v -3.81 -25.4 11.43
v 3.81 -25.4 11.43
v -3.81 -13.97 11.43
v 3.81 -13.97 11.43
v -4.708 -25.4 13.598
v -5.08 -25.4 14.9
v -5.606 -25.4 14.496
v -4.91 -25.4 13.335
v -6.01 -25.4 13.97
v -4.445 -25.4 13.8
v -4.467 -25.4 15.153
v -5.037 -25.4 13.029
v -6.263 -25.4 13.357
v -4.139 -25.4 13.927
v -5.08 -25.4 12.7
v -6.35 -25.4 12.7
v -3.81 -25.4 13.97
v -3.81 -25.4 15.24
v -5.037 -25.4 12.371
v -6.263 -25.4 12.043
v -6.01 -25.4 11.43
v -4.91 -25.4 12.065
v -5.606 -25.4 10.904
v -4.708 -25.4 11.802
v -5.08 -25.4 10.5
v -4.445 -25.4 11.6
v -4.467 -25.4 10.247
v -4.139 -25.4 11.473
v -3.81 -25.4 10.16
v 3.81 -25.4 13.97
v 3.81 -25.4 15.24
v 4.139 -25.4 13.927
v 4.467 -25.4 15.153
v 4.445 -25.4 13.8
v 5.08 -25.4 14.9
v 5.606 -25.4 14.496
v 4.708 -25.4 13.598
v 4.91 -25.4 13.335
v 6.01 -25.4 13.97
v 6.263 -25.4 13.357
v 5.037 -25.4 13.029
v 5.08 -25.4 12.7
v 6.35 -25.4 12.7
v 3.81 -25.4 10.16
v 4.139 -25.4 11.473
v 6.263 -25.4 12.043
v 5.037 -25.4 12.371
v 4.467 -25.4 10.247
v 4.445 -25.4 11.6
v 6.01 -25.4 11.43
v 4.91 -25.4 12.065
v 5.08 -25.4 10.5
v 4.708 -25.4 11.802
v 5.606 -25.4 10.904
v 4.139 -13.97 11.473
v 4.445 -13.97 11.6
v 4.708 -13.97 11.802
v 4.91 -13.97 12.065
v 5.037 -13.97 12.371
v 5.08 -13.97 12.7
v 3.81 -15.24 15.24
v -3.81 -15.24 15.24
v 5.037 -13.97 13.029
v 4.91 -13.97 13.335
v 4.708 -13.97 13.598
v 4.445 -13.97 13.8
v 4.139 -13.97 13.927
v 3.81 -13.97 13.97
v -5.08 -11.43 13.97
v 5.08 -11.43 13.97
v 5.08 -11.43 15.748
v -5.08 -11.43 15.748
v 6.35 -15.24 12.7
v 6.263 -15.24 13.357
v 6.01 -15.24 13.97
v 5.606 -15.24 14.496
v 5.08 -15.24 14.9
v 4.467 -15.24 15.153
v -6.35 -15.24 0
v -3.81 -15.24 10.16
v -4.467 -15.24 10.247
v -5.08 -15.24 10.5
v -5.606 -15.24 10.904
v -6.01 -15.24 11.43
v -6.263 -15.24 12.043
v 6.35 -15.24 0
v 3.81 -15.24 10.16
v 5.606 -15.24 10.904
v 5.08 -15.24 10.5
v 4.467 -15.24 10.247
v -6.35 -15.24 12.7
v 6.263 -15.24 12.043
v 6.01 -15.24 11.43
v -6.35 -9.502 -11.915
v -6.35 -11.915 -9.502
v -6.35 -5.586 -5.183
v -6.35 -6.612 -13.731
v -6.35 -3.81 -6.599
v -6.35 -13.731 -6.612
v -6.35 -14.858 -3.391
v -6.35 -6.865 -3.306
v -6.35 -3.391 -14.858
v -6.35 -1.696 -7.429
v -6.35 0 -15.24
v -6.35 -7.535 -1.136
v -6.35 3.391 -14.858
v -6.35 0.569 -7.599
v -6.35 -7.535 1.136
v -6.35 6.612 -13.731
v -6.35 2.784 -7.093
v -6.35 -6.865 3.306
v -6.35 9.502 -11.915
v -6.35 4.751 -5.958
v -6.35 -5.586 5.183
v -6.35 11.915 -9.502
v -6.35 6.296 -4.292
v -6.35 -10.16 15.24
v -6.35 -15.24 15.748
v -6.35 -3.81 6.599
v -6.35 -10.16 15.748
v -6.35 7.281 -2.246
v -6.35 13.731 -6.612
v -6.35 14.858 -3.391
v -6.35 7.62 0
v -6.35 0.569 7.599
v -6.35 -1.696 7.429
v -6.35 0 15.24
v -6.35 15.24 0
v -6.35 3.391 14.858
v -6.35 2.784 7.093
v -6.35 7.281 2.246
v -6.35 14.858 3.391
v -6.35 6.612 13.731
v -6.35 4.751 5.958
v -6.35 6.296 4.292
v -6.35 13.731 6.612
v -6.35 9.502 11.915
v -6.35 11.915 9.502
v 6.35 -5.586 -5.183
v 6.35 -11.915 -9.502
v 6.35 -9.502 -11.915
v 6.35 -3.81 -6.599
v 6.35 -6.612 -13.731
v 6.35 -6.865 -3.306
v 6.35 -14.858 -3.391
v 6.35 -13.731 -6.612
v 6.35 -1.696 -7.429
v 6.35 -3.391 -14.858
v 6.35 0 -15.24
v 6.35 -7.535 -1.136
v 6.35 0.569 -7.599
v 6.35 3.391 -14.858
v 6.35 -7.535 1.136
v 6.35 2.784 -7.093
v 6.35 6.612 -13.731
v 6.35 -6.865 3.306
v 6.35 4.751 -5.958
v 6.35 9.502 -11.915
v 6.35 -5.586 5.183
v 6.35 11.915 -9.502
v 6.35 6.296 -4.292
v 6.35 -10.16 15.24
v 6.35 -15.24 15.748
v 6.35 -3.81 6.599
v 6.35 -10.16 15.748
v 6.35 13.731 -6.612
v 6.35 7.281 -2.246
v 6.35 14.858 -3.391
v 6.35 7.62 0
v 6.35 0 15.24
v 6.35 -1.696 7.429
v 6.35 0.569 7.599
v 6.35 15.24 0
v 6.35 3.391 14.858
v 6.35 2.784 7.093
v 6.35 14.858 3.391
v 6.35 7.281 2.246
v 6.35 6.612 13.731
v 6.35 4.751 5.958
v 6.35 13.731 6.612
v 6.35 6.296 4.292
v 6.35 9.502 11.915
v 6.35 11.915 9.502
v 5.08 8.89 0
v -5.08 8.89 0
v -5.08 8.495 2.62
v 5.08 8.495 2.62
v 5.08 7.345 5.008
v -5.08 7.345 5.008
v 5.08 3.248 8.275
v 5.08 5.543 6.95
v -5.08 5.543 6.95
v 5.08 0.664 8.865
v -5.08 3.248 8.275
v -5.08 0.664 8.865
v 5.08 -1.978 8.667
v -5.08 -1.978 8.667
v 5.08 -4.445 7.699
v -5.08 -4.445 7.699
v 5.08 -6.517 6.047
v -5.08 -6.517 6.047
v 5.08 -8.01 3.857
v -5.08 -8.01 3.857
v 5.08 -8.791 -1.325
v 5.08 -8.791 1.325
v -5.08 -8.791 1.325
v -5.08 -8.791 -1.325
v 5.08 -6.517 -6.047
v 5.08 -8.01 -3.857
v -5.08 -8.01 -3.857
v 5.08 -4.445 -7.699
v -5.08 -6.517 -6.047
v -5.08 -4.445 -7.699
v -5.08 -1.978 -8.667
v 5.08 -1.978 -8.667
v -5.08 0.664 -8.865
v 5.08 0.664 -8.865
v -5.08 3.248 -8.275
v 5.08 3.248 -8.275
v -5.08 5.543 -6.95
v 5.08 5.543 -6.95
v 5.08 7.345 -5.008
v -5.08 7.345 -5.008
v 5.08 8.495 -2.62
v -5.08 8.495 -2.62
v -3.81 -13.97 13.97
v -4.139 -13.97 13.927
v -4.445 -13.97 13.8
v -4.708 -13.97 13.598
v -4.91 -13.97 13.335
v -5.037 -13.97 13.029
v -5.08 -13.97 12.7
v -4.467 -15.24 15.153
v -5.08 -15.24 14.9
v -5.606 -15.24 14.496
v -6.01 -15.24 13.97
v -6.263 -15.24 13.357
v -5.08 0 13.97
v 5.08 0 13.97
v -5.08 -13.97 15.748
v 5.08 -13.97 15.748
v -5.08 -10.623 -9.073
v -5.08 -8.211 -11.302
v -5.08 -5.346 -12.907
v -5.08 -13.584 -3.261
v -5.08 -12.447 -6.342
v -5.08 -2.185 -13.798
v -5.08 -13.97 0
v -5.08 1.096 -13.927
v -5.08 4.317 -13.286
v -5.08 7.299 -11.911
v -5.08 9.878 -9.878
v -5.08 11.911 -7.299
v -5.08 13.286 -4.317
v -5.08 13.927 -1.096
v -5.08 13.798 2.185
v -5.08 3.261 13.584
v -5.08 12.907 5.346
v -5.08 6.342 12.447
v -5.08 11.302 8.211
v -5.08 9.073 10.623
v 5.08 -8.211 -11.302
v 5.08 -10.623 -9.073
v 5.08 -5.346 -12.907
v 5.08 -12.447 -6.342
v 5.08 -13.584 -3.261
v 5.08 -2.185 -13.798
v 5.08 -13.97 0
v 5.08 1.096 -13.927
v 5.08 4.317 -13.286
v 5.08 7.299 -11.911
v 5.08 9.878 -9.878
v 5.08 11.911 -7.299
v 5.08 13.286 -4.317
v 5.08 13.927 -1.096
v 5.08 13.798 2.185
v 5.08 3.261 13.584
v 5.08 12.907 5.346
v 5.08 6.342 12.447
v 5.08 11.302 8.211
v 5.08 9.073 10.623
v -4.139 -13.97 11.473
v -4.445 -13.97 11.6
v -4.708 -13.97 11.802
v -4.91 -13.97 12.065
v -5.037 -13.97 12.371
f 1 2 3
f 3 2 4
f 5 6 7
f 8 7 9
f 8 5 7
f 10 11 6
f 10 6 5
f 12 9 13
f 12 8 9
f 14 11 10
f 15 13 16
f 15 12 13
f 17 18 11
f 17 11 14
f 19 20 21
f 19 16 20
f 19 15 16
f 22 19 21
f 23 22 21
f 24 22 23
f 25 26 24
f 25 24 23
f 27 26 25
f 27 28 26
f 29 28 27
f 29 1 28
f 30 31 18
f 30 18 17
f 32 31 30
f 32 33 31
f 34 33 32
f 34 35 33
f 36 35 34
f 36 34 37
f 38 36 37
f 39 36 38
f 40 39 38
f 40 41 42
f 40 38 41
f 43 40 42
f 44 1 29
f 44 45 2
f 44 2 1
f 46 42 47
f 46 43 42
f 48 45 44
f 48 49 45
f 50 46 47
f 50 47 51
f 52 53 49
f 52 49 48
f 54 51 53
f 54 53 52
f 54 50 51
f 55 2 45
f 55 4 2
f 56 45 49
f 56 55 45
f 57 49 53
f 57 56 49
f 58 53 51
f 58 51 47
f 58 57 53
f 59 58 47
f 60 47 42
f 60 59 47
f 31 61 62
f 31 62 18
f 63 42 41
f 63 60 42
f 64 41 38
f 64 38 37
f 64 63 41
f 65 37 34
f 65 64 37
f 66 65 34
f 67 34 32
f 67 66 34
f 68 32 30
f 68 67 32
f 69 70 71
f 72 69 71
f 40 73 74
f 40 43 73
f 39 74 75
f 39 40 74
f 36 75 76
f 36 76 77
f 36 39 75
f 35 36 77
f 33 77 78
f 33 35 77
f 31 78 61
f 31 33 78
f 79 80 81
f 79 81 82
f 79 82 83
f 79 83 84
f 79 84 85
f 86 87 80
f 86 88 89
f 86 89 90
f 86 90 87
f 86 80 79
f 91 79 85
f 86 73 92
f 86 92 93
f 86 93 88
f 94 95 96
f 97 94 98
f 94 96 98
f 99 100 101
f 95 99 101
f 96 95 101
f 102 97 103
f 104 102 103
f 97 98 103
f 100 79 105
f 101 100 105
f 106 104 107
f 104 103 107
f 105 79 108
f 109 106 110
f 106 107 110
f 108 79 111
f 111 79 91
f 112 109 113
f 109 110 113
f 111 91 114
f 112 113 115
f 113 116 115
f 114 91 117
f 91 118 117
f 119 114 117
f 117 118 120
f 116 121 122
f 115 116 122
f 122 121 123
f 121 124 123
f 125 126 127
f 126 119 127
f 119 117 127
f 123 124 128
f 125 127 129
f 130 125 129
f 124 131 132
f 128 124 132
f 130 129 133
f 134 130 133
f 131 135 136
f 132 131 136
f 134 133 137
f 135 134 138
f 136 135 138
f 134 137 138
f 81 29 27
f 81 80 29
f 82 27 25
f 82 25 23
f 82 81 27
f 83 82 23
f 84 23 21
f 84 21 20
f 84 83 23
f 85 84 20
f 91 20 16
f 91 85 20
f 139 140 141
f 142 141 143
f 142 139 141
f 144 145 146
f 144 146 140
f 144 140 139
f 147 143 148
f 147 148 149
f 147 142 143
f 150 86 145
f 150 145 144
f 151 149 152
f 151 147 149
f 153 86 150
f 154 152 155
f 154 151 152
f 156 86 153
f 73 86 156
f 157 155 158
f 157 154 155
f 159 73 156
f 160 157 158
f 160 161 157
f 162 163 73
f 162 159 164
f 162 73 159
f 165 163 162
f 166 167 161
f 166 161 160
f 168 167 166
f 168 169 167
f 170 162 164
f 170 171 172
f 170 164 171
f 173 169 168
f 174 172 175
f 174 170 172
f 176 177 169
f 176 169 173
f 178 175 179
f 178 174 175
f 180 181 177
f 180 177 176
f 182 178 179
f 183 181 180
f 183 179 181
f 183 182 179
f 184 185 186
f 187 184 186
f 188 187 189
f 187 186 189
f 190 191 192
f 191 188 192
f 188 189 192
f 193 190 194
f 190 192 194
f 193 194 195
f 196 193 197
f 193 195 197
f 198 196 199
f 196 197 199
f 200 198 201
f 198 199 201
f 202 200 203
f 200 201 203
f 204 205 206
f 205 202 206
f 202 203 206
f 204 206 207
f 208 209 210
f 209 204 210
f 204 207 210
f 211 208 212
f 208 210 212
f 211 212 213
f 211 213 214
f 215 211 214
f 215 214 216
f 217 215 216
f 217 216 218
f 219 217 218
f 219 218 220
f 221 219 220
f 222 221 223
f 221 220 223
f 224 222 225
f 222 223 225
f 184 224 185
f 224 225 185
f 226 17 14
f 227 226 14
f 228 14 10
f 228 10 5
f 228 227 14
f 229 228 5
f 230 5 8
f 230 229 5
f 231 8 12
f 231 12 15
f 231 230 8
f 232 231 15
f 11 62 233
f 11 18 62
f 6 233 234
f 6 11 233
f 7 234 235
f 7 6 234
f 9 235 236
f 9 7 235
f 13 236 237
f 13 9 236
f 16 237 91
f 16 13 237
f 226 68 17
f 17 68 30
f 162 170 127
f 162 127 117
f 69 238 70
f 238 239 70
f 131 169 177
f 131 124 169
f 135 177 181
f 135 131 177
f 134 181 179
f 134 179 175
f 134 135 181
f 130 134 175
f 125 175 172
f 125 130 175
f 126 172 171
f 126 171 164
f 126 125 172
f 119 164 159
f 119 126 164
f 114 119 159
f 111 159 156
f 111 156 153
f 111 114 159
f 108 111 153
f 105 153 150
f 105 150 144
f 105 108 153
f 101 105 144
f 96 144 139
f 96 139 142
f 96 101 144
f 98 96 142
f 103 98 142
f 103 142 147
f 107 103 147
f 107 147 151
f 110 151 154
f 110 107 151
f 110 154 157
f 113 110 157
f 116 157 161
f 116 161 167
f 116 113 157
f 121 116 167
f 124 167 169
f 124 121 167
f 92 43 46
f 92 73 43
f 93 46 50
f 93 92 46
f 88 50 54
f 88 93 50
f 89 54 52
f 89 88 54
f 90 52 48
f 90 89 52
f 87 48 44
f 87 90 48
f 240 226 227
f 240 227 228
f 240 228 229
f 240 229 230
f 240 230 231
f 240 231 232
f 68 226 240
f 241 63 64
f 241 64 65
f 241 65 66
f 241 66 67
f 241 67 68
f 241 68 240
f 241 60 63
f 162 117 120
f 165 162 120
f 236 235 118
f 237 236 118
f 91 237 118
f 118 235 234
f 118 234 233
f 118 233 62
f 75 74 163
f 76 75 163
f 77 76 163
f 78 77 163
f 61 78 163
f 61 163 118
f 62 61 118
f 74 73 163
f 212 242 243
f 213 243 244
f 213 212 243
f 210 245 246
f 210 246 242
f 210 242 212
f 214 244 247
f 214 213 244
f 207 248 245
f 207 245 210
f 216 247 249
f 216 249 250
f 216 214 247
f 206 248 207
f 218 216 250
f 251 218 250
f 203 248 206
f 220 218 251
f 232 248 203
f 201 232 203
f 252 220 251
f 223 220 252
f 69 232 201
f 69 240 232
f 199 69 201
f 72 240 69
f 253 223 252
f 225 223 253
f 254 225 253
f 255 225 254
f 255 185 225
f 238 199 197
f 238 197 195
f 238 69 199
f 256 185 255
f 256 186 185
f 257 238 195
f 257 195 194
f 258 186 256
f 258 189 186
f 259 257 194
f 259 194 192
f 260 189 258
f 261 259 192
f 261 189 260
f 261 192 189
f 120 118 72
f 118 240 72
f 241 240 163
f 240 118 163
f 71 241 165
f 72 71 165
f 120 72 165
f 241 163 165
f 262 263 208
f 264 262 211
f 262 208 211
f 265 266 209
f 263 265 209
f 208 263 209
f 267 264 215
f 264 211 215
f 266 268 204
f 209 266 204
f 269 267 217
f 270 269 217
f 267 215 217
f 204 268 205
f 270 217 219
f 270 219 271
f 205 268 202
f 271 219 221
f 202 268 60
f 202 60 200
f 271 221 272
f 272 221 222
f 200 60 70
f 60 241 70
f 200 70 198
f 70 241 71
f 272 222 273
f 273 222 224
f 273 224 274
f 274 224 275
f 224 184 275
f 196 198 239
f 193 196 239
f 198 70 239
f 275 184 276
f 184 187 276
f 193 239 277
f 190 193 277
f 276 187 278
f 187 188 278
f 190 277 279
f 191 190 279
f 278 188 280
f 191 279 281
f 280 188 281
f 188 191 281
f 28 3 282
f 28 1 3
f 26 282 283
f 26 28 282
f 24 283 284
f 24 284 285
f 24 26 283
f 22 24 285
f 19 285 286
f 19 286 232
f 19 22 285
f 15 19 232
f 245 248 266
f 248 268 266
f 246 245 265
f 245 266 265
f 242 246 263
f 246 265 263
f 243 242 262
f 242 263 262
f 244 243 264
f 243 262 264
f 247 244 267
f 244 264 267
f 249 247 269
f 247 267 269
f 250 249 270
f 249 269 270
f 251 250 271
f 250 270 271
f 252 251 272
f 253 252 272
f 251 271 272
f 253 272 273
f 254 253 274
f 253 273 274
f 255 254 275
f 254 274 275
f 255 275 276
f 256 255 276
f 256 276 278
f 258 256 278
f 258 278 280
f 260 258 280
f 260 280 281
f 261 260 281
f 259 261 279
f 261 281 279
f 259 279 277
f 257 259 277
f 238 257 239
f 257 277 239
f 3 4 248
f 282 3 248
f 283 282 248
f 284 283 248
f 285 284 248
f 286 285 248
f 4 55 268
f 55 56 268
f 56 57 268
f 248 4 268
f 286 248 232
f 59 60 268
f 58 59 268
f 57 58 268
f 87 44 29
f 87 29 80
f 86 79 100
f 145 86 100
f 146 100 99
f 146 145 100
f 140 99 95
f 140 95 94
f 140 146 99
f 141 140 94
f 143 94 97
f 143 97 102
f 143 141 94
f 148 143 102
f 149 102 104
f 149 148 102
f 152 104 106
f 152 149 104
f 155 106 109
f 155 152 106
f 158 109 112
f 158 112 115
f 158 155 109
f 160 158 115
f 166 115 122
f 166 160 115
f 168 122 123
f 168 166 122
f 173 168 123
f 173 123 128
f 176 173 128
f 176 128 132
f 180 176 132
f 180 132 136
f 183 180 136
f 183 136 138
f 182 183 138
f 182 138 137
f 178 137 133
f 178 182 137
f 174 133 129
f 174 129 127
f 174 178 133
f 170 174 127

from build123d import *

# Parameters (mm, degrees)
F0_R     = 7.62
F0_W     = 5.08
F0_H     = 0.508
F1_DEPTH = 6.35
F2_T     = -1.27
F3_R     = 2.53999
F4_R     = 1.26999


# Not quite as in the source:
# - a fillet or chamfer is up to 0.001 mm smaller than in the source, because OpenCascade refuses the exact size


with BuildPart() as f1:
    # F0 (on Right) → F1 (new body, symmetric)
    with BuildSketch(Plane.YZ):
        with BuildLine():
            Line((-15.24, 15.24), (-25.4, 15.24))
            Line((-25.4, 15.24), (-25.4, 10.16))
            Line((-25.4, 10.16), (-15.24, 10.16))
            Line((-15.24, 10.16), (-15.24, 0))
            ThreePointArc((-15.24, 0), (10.7763073453, -10.7763073453), (0, 15.24))
            Line((0, 15.24), (-10.16, 15.24))
            Line((-10.16, 15.24), (-15.24, 15.24))
        make_face()
        Circle(F0_R, mode=Mode.SUBTRACT)
        with Locations((-12.7, 15.494)):
            Rectangle(F0_W, F0_H)
    extrude(amount=F1_DEPTH, both=True)

    # F2
    f2_openings = [f1.faces().sort_by_distance(p)[0] for p in [
        (0, -25.4, 12.7),
        (0, -12.7, 15.748),
    ]]
    offset(amount=F2_T, openings=f2_openings, kind=Kind.INTERSECTION)

    # F3 (radius 2.54 in the source; OpenCascade refuses exactly that, so slightly less here)
    f3_edges = [f1.edges().sort_by_distance(p)[0] for p in [
        (-6.35, -20.32, 15.24),
        (-6.35, -20.32, 10.16),
        (6.35, -20.32, 15.24),
        (6.35, -20.32, 10.16),
    ]]
    fillet(f3_edges, radius=F3_R)

    # F4 (radius 1.27 in the source; OpenCascade refuses exactly that, so slightly less here)
    f4_edges = [f1.edges().sort_by_distance(p)[0] for p in [
        (-5.08, -19.685, 11.43),
        (-5.08, -19.685, 13.97),
        (5.08, -19.685, 13.97),
        (5.08, -19.685, 11.43),
    ]]
    fillet(f4_edges, radius=F4_R)


solid = f1.part
